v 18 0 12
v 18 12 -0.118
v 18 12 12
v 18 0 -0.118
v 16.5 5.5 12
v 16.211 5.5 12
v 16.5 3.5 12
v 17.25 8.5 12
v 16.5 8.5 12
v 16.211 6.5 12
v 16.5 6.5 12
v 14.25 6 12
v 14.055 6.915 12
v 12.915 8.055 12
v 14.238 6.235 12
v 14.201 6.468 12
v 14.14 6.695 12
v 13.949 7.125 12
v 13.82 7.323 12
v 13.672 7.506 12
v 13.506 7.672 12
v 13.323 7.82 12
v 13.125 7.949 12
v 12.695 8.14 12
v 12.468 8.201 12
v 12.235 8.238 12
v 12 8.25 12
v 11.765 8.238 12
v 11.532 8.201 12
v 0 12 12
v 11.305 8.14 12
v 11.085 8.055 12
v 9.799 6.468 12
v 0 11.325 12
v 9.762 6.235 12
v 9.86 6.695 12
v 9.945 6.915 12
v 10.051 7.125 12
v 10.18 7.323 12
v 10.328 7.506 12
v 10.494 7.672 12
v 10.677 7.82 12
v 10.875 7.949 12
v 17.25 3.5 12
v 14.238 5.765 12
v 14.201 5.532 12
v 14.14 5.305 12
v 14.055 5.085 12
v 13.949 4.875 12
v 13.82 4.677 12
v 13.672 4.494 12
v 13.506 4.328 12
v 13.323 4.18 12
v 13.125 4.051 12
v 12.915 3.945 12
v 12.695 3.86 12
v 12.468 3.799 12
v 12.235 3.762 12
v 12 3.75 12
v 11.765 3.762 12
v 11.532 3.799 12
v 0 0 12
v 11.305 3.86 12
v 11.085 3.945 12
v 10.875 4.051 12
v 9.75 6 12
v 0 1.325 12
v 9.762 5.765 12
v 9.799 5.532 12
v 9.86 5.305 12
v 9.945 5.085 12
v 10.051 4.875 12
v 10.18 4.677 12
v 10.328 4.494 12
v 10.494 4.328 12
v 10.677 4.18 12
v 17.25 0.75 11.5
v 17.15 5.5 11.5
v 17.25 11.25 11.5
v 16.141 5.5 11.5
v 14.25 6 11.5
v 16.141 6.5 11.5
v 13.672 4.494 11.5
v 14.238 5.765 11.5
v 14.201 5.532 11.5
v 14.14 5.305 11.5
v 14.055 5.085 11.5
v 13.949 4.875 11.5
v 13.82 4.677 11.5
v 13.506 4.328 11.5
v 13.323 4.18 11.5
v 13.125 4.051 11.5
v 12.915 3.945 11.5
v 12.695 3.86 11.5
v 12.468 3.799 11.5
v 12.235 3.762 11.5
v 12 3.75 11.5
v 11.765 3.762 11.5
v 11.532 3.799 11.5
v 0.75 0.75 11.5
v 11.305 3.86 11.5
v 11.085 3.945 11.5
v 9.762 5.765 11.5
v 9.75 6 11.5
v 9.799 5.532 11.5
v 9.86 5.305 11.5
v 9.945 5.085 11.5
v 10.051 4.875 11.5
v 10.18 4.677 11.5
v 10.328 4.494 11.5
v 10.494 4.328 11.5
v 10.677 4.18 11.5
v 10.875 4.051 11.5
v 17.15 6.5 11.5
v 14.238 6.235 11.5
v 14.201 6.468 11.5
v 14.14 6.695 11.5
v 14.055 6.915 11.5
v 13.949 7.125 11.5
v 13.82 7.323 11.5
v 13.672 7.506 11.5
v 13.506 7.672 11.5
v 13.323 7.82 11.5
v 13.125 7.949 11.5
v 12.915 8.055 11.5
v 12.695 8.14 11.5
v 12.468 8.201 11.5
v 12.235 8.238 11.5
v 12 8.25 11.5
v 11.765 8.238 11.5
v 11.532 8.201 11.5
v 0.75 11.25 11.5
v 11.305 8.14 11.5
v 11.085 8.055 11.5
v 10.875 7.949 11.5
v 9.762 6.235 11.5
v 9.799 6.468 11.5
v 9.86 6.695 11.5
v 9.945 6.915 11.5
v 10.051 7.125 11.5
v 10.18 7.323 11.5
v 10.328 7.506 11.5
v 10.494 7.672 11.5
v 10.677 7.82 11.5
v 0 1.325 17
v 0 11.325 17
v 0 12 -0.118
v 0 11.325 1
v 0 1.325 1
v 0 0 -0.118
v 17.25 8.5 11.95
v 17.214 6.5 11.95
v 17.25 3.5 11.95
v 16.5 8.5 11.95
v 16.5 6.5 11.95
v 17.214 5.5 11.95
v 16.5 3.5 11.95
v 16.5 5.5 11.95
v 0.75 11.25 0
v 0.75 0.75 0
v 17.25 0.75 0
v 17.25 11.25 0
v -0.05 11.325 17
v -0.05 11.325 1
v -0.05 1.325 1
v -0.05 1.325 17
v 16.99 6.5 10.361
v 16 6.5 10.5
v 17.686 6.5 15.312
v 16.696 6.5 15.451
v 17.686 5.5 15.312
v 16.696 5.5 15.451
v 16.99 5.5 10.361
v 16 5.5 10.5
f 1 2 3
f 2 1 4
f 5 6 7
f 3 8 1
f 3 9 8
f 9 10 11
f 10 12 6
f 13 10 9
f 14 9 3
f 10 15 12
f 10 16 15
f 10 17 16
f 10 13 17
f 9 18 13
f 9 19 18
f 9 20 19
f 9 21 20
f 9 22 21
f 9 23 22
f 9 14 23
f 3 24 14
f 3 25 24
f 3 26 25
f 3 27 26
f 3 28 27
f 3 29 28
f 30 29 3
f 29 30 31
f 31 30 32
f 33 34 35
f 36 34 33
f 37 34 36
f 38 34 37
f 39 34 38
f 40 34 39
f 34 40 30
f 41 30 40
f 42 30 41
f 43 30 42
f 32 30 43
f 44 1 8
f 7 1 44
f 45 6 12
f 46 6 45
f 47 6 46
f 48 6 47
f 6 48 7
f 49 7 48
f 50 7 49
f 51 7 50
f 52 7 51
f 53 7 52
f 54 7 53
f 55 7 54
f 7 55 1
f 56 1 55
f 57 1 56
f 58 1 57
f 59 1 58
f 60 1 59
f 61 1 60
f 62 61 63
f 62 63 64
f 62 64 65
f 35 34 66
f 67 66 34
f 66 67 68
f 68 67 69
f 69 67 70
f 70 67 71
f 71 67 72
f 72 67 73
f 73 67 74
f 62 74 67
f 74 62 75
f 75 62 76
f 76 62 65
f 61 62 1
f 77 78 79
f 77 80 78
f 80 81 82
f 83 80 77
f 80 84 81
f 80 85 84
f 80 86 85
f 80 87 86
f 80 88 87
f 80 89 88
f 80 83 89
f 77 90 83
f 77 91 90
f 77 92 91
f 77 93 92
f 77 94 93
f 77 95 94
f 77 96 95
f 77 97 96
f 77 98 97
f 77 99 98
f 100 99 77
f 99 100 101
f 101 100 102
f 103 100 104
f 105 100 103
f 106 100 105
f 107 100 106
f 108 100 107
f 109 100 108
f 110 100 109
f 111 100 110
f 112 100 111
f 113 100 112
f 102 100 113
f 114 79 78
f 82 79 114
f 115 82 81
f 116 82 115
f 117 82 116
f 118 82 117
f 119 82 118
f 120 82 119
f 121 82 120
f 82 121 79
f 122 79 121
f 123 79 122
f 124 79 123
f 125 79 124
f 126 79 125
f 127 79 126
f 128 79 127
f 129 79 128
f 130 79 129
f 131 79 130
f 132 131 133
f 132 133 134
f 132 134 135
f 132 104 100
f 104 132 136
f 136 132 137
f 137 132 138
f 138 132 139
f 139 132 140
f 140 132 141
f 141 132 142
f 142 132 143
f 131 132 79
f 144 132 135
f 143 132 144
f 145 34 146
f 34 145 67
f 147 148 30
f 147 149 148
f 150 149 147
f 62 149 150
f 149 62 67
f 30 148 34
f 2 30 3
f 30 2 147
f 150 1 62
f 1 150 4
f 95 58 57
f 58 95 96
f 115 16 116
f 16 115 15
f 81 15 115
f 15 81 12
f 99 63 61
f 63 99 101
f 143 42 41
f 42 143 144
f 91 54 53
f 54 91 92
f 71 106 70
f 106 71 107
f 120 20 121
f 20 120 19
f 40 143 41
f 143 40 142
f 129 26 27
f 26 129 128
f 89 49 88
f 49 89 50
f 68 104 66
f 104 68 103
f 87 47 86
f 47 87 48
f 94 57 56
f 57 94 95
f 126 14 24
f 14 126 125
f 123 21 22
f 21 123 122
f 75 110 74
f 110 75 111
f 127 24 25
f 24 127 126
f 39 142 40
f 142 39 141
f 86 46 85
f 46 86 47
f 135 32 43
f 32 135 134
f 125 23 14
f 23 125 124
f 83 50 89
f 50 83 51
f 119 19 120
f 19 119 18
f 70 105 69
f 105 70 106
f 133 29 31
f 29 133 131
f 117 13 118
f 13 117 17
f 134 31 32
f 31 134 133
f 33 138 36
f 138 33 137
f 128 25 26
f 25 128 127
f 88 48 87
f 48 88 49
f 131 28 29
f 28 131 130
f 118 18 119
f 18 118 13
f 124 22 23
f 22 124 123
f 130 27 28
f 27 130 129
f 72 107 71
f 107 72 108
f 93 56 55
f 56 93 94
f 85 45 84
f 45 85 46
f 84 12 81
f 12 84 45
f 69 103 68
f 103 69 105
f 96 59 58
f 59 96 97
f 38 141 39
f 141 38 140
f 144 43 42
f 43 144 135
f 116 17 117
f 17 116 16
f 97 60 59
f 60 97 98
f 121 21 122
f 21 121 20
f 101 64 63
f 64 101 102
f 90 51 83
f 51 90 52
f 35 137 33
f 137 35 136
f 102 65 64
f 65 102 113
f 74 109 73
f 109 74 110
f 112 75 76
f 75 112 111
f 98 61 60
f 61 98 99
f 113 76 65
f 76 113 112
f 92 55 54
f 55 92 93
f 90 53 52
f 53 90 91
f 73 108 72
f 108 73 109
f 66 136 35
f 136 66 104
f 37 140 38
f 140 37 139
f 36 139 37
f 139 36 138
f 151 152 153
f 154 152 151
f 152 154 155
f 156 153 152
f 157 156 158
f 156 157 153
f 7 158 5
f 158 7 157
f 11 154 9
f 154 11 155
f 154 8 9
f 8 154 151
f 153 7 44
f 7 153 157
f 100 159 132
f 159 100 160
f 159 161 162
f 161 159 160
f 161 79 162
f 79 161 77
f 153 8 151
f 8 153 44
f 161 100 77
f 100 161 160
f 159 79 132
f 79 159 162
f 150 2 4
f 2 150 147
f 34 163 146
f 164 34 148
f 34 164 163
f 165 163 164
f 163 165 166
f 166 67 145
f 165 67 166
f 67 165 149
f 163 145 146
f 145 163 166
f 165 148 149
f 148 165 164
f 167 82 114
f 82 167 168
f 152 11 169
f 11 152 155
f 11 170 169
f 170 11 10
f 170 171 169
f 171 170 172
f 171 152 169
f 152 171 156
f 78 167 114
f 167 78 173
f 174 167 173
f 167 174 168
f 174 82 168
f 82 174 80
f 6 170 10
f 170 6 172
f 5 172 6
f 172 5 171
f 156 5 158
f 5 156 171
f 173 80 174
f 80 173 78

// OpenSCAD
// Cajón Family — OpenSCAD parametric master
// Heifer Zephyr Instruments — Tony Koop
// Generates a six-panel cajón shell with sound-hole, snare-mount keep-out,
// optional inlay zone visualization, and finger-joint corners.
//
// Edit MEMBER below and render. Export DXF (Projection -> Front view) for laser
// or STL for full-body visualization.
//
// Units: inches.

/* [Family member] */
MEMBER = "Standard"; // [Compact, Standard, Bass]

/* [Variant] */
JOINERY = "FingerJoint"; // [FingerJoint, Dovetail, Rabbet, MiterSpline]
SHOW_INLAY_ZONE = true;
SHOW_SNARE_BLOCK = true;
EXPLODE = 0; // 0 = assembled; >0 = exploded view in inches

/* [Override (only used if MEMBER = "Custom")] */
CUSTOM_H = 18;
CUSTOM_W = 12;
CUSTOM_D = 12;
CUSTOM_HOLE = 4.5;

/* [Constants] */
BODY_T   = 0.75;
BACK_T   = 0.5;
TAPA_T   = 0.118;
GLUE_BLOCK = 1.0; // 1" cross-section triangle
$fn = 60;

// === Member dimensions ===
H = MEMBER == "Compact"  ? 15 :
    MEMBER == "Standard" ? 18 :
    MEMBER == "Bass"     ? 22 :
    CUSTOM_H;
W = MEMBER == "Compact"  ? 11 :
    MEMBER == "Standard" ? 12 :
    MEMBER == "Bass"     ? 14 :
    CUSTOM_W;
D = MEMBER == "Compact"  ? 11 :
    MEMBER == "Standard" ? 12 :
    MEMBER == "Bass"     ? 14 :
    CUSTOM_D;
HOLE = MEMBER == "Compact"  ? 4.0 :
       MEMBER == "Standard" ? 4.5 :
       MEMBER == "Bass"     ? 5.0 :
       CUSTOM_HOLE;
BT = MEMBER == "Compact"  ? 0.625 :
     BODY_T;

// === Internal cavity ===
function cavity_volume() = (W - 2*BT) * (D - 2*BT) * (H - BODY_T - BACK_T);

// === Box body (5 panels: top, bottom, 2 sides, back; tapa drawn separately) ===

module side_panel() {
    cube([H, BT, D]);
}

module top_panel() {
    cube([BT, W, D]);
}

module bottom_panel() {
    cube([BT, W, D]);
}

module back_panel() {
    difference() {
        cube([H, W, BACK_T]);
        // Sound hole — centred L-R, 1/3 H from top
        translate([H * 2/3, W/2, -0.1])
            cylinder(h = BACK_T + 0.2, r = HOLE/2);
        // Snare mount block keep-out — interior, top region (visualization only)
        if (SHOW_SNARE_BLOCK) {
            translate([H - 1.5, W/2 - 2.5, BACK_T - 0.05])
                cube([1.0, 5.0, 0.1]);
        }
    }
}

module tapa() {
    cube([H, W, TAPA_T]);
}

// === Inlay zone visualization ===
module inlay_zone(panel_h, panel_w) {
    // 70% of panel area, centred, 1" keep-out from edges
    color("orange", 0.25)
    translate([1, 1, -0.05])
        cube([panel_h - 2, panel_w - 2, 0.05]);
}

// === Glue blocks (8 internal corners) ===
module glue_block(h) {
    // Triangular cross-section, 1" x 1" right angle
    linear_extrude(h)
        polygon([[0,0], [GLUE_BLOCK, 0], [0, GLUE_BLOCK]]);
}

module all_glue_blocks() {
    panel_h = H - BODY_T*2;
    color("saddlebrown", 0.7) {
        // Bottom 4 corners
        translate([BODY_T, BT, BACK_T]) glue_block(panel_h);
        translate([BODY_T, W - BT, BACK_T]) rotate([0, 0, -90]) glue_block(panel_h);
        translate([BODY_T, BT, D - 0]) rotate([0, 0, 0]) mirror([0,0,1]) glue_block(panel_h);
        // (Skipping the others for sketch simplicity — real model gets 8)
    }
}

// === Assemble box ===

module cajon_assembly() {
    // Bottom
    bottom_panel();
    // Top
    translate([H - BODY_T, 0, 0]) top_panel();
    // Side L
    translate([0, 0, 0]) side_panel();
    // Side R
    translate([0, W - BT, 0]) side_panel();
    // Back
    translate([0, 0, D - BACK_T]) back_panel();
    // Tapa (front) — explode out front face
    translate([0, 0, -TAPA_T - EXPLODE]) tapa();

    if (SHOW_INLAY_ZONE) {
        // Side L panel inlay zone
        translate([0, BT/2 - 0.05, 0])
            rotate([90, 0, 90])
                inlay_zone(D, H);
    }

    if (SHOW_SNARE_BLOCK) {
        // Internal snare mount block on back panel (option B)
        color("burlywood", 0.85)
        translate([H - 2, W/2 - 0.5, D - BACK_T - 1.0])
            rotate([0, 8, 0])  // 8-degree angle off vertical
                cube([1.0, 1.0, 5.0]);
    }
}

// === Render ===

cajon_assembly();

// === Console output (echo to OpenSCAD console) ===

echo(str("Cajón family member: ", MEMBER));
echo(str("Outer dims H x W x D: ", H, " x ", W, " x ", D, " in"));
echo(str("Sound hole diameter: ", HOLE, " in"));
echo(str("Internal cavity volume: ", cavity_volume(), " in^3"));
echo(str("Body thickness: ", BT, " in; Back: ", BACK_T, " in; Tapa: ", TAPA_T, " in (3 mm)"));
echo("Cross-check vs cajon-design-table.xlsx — values must agree.");
